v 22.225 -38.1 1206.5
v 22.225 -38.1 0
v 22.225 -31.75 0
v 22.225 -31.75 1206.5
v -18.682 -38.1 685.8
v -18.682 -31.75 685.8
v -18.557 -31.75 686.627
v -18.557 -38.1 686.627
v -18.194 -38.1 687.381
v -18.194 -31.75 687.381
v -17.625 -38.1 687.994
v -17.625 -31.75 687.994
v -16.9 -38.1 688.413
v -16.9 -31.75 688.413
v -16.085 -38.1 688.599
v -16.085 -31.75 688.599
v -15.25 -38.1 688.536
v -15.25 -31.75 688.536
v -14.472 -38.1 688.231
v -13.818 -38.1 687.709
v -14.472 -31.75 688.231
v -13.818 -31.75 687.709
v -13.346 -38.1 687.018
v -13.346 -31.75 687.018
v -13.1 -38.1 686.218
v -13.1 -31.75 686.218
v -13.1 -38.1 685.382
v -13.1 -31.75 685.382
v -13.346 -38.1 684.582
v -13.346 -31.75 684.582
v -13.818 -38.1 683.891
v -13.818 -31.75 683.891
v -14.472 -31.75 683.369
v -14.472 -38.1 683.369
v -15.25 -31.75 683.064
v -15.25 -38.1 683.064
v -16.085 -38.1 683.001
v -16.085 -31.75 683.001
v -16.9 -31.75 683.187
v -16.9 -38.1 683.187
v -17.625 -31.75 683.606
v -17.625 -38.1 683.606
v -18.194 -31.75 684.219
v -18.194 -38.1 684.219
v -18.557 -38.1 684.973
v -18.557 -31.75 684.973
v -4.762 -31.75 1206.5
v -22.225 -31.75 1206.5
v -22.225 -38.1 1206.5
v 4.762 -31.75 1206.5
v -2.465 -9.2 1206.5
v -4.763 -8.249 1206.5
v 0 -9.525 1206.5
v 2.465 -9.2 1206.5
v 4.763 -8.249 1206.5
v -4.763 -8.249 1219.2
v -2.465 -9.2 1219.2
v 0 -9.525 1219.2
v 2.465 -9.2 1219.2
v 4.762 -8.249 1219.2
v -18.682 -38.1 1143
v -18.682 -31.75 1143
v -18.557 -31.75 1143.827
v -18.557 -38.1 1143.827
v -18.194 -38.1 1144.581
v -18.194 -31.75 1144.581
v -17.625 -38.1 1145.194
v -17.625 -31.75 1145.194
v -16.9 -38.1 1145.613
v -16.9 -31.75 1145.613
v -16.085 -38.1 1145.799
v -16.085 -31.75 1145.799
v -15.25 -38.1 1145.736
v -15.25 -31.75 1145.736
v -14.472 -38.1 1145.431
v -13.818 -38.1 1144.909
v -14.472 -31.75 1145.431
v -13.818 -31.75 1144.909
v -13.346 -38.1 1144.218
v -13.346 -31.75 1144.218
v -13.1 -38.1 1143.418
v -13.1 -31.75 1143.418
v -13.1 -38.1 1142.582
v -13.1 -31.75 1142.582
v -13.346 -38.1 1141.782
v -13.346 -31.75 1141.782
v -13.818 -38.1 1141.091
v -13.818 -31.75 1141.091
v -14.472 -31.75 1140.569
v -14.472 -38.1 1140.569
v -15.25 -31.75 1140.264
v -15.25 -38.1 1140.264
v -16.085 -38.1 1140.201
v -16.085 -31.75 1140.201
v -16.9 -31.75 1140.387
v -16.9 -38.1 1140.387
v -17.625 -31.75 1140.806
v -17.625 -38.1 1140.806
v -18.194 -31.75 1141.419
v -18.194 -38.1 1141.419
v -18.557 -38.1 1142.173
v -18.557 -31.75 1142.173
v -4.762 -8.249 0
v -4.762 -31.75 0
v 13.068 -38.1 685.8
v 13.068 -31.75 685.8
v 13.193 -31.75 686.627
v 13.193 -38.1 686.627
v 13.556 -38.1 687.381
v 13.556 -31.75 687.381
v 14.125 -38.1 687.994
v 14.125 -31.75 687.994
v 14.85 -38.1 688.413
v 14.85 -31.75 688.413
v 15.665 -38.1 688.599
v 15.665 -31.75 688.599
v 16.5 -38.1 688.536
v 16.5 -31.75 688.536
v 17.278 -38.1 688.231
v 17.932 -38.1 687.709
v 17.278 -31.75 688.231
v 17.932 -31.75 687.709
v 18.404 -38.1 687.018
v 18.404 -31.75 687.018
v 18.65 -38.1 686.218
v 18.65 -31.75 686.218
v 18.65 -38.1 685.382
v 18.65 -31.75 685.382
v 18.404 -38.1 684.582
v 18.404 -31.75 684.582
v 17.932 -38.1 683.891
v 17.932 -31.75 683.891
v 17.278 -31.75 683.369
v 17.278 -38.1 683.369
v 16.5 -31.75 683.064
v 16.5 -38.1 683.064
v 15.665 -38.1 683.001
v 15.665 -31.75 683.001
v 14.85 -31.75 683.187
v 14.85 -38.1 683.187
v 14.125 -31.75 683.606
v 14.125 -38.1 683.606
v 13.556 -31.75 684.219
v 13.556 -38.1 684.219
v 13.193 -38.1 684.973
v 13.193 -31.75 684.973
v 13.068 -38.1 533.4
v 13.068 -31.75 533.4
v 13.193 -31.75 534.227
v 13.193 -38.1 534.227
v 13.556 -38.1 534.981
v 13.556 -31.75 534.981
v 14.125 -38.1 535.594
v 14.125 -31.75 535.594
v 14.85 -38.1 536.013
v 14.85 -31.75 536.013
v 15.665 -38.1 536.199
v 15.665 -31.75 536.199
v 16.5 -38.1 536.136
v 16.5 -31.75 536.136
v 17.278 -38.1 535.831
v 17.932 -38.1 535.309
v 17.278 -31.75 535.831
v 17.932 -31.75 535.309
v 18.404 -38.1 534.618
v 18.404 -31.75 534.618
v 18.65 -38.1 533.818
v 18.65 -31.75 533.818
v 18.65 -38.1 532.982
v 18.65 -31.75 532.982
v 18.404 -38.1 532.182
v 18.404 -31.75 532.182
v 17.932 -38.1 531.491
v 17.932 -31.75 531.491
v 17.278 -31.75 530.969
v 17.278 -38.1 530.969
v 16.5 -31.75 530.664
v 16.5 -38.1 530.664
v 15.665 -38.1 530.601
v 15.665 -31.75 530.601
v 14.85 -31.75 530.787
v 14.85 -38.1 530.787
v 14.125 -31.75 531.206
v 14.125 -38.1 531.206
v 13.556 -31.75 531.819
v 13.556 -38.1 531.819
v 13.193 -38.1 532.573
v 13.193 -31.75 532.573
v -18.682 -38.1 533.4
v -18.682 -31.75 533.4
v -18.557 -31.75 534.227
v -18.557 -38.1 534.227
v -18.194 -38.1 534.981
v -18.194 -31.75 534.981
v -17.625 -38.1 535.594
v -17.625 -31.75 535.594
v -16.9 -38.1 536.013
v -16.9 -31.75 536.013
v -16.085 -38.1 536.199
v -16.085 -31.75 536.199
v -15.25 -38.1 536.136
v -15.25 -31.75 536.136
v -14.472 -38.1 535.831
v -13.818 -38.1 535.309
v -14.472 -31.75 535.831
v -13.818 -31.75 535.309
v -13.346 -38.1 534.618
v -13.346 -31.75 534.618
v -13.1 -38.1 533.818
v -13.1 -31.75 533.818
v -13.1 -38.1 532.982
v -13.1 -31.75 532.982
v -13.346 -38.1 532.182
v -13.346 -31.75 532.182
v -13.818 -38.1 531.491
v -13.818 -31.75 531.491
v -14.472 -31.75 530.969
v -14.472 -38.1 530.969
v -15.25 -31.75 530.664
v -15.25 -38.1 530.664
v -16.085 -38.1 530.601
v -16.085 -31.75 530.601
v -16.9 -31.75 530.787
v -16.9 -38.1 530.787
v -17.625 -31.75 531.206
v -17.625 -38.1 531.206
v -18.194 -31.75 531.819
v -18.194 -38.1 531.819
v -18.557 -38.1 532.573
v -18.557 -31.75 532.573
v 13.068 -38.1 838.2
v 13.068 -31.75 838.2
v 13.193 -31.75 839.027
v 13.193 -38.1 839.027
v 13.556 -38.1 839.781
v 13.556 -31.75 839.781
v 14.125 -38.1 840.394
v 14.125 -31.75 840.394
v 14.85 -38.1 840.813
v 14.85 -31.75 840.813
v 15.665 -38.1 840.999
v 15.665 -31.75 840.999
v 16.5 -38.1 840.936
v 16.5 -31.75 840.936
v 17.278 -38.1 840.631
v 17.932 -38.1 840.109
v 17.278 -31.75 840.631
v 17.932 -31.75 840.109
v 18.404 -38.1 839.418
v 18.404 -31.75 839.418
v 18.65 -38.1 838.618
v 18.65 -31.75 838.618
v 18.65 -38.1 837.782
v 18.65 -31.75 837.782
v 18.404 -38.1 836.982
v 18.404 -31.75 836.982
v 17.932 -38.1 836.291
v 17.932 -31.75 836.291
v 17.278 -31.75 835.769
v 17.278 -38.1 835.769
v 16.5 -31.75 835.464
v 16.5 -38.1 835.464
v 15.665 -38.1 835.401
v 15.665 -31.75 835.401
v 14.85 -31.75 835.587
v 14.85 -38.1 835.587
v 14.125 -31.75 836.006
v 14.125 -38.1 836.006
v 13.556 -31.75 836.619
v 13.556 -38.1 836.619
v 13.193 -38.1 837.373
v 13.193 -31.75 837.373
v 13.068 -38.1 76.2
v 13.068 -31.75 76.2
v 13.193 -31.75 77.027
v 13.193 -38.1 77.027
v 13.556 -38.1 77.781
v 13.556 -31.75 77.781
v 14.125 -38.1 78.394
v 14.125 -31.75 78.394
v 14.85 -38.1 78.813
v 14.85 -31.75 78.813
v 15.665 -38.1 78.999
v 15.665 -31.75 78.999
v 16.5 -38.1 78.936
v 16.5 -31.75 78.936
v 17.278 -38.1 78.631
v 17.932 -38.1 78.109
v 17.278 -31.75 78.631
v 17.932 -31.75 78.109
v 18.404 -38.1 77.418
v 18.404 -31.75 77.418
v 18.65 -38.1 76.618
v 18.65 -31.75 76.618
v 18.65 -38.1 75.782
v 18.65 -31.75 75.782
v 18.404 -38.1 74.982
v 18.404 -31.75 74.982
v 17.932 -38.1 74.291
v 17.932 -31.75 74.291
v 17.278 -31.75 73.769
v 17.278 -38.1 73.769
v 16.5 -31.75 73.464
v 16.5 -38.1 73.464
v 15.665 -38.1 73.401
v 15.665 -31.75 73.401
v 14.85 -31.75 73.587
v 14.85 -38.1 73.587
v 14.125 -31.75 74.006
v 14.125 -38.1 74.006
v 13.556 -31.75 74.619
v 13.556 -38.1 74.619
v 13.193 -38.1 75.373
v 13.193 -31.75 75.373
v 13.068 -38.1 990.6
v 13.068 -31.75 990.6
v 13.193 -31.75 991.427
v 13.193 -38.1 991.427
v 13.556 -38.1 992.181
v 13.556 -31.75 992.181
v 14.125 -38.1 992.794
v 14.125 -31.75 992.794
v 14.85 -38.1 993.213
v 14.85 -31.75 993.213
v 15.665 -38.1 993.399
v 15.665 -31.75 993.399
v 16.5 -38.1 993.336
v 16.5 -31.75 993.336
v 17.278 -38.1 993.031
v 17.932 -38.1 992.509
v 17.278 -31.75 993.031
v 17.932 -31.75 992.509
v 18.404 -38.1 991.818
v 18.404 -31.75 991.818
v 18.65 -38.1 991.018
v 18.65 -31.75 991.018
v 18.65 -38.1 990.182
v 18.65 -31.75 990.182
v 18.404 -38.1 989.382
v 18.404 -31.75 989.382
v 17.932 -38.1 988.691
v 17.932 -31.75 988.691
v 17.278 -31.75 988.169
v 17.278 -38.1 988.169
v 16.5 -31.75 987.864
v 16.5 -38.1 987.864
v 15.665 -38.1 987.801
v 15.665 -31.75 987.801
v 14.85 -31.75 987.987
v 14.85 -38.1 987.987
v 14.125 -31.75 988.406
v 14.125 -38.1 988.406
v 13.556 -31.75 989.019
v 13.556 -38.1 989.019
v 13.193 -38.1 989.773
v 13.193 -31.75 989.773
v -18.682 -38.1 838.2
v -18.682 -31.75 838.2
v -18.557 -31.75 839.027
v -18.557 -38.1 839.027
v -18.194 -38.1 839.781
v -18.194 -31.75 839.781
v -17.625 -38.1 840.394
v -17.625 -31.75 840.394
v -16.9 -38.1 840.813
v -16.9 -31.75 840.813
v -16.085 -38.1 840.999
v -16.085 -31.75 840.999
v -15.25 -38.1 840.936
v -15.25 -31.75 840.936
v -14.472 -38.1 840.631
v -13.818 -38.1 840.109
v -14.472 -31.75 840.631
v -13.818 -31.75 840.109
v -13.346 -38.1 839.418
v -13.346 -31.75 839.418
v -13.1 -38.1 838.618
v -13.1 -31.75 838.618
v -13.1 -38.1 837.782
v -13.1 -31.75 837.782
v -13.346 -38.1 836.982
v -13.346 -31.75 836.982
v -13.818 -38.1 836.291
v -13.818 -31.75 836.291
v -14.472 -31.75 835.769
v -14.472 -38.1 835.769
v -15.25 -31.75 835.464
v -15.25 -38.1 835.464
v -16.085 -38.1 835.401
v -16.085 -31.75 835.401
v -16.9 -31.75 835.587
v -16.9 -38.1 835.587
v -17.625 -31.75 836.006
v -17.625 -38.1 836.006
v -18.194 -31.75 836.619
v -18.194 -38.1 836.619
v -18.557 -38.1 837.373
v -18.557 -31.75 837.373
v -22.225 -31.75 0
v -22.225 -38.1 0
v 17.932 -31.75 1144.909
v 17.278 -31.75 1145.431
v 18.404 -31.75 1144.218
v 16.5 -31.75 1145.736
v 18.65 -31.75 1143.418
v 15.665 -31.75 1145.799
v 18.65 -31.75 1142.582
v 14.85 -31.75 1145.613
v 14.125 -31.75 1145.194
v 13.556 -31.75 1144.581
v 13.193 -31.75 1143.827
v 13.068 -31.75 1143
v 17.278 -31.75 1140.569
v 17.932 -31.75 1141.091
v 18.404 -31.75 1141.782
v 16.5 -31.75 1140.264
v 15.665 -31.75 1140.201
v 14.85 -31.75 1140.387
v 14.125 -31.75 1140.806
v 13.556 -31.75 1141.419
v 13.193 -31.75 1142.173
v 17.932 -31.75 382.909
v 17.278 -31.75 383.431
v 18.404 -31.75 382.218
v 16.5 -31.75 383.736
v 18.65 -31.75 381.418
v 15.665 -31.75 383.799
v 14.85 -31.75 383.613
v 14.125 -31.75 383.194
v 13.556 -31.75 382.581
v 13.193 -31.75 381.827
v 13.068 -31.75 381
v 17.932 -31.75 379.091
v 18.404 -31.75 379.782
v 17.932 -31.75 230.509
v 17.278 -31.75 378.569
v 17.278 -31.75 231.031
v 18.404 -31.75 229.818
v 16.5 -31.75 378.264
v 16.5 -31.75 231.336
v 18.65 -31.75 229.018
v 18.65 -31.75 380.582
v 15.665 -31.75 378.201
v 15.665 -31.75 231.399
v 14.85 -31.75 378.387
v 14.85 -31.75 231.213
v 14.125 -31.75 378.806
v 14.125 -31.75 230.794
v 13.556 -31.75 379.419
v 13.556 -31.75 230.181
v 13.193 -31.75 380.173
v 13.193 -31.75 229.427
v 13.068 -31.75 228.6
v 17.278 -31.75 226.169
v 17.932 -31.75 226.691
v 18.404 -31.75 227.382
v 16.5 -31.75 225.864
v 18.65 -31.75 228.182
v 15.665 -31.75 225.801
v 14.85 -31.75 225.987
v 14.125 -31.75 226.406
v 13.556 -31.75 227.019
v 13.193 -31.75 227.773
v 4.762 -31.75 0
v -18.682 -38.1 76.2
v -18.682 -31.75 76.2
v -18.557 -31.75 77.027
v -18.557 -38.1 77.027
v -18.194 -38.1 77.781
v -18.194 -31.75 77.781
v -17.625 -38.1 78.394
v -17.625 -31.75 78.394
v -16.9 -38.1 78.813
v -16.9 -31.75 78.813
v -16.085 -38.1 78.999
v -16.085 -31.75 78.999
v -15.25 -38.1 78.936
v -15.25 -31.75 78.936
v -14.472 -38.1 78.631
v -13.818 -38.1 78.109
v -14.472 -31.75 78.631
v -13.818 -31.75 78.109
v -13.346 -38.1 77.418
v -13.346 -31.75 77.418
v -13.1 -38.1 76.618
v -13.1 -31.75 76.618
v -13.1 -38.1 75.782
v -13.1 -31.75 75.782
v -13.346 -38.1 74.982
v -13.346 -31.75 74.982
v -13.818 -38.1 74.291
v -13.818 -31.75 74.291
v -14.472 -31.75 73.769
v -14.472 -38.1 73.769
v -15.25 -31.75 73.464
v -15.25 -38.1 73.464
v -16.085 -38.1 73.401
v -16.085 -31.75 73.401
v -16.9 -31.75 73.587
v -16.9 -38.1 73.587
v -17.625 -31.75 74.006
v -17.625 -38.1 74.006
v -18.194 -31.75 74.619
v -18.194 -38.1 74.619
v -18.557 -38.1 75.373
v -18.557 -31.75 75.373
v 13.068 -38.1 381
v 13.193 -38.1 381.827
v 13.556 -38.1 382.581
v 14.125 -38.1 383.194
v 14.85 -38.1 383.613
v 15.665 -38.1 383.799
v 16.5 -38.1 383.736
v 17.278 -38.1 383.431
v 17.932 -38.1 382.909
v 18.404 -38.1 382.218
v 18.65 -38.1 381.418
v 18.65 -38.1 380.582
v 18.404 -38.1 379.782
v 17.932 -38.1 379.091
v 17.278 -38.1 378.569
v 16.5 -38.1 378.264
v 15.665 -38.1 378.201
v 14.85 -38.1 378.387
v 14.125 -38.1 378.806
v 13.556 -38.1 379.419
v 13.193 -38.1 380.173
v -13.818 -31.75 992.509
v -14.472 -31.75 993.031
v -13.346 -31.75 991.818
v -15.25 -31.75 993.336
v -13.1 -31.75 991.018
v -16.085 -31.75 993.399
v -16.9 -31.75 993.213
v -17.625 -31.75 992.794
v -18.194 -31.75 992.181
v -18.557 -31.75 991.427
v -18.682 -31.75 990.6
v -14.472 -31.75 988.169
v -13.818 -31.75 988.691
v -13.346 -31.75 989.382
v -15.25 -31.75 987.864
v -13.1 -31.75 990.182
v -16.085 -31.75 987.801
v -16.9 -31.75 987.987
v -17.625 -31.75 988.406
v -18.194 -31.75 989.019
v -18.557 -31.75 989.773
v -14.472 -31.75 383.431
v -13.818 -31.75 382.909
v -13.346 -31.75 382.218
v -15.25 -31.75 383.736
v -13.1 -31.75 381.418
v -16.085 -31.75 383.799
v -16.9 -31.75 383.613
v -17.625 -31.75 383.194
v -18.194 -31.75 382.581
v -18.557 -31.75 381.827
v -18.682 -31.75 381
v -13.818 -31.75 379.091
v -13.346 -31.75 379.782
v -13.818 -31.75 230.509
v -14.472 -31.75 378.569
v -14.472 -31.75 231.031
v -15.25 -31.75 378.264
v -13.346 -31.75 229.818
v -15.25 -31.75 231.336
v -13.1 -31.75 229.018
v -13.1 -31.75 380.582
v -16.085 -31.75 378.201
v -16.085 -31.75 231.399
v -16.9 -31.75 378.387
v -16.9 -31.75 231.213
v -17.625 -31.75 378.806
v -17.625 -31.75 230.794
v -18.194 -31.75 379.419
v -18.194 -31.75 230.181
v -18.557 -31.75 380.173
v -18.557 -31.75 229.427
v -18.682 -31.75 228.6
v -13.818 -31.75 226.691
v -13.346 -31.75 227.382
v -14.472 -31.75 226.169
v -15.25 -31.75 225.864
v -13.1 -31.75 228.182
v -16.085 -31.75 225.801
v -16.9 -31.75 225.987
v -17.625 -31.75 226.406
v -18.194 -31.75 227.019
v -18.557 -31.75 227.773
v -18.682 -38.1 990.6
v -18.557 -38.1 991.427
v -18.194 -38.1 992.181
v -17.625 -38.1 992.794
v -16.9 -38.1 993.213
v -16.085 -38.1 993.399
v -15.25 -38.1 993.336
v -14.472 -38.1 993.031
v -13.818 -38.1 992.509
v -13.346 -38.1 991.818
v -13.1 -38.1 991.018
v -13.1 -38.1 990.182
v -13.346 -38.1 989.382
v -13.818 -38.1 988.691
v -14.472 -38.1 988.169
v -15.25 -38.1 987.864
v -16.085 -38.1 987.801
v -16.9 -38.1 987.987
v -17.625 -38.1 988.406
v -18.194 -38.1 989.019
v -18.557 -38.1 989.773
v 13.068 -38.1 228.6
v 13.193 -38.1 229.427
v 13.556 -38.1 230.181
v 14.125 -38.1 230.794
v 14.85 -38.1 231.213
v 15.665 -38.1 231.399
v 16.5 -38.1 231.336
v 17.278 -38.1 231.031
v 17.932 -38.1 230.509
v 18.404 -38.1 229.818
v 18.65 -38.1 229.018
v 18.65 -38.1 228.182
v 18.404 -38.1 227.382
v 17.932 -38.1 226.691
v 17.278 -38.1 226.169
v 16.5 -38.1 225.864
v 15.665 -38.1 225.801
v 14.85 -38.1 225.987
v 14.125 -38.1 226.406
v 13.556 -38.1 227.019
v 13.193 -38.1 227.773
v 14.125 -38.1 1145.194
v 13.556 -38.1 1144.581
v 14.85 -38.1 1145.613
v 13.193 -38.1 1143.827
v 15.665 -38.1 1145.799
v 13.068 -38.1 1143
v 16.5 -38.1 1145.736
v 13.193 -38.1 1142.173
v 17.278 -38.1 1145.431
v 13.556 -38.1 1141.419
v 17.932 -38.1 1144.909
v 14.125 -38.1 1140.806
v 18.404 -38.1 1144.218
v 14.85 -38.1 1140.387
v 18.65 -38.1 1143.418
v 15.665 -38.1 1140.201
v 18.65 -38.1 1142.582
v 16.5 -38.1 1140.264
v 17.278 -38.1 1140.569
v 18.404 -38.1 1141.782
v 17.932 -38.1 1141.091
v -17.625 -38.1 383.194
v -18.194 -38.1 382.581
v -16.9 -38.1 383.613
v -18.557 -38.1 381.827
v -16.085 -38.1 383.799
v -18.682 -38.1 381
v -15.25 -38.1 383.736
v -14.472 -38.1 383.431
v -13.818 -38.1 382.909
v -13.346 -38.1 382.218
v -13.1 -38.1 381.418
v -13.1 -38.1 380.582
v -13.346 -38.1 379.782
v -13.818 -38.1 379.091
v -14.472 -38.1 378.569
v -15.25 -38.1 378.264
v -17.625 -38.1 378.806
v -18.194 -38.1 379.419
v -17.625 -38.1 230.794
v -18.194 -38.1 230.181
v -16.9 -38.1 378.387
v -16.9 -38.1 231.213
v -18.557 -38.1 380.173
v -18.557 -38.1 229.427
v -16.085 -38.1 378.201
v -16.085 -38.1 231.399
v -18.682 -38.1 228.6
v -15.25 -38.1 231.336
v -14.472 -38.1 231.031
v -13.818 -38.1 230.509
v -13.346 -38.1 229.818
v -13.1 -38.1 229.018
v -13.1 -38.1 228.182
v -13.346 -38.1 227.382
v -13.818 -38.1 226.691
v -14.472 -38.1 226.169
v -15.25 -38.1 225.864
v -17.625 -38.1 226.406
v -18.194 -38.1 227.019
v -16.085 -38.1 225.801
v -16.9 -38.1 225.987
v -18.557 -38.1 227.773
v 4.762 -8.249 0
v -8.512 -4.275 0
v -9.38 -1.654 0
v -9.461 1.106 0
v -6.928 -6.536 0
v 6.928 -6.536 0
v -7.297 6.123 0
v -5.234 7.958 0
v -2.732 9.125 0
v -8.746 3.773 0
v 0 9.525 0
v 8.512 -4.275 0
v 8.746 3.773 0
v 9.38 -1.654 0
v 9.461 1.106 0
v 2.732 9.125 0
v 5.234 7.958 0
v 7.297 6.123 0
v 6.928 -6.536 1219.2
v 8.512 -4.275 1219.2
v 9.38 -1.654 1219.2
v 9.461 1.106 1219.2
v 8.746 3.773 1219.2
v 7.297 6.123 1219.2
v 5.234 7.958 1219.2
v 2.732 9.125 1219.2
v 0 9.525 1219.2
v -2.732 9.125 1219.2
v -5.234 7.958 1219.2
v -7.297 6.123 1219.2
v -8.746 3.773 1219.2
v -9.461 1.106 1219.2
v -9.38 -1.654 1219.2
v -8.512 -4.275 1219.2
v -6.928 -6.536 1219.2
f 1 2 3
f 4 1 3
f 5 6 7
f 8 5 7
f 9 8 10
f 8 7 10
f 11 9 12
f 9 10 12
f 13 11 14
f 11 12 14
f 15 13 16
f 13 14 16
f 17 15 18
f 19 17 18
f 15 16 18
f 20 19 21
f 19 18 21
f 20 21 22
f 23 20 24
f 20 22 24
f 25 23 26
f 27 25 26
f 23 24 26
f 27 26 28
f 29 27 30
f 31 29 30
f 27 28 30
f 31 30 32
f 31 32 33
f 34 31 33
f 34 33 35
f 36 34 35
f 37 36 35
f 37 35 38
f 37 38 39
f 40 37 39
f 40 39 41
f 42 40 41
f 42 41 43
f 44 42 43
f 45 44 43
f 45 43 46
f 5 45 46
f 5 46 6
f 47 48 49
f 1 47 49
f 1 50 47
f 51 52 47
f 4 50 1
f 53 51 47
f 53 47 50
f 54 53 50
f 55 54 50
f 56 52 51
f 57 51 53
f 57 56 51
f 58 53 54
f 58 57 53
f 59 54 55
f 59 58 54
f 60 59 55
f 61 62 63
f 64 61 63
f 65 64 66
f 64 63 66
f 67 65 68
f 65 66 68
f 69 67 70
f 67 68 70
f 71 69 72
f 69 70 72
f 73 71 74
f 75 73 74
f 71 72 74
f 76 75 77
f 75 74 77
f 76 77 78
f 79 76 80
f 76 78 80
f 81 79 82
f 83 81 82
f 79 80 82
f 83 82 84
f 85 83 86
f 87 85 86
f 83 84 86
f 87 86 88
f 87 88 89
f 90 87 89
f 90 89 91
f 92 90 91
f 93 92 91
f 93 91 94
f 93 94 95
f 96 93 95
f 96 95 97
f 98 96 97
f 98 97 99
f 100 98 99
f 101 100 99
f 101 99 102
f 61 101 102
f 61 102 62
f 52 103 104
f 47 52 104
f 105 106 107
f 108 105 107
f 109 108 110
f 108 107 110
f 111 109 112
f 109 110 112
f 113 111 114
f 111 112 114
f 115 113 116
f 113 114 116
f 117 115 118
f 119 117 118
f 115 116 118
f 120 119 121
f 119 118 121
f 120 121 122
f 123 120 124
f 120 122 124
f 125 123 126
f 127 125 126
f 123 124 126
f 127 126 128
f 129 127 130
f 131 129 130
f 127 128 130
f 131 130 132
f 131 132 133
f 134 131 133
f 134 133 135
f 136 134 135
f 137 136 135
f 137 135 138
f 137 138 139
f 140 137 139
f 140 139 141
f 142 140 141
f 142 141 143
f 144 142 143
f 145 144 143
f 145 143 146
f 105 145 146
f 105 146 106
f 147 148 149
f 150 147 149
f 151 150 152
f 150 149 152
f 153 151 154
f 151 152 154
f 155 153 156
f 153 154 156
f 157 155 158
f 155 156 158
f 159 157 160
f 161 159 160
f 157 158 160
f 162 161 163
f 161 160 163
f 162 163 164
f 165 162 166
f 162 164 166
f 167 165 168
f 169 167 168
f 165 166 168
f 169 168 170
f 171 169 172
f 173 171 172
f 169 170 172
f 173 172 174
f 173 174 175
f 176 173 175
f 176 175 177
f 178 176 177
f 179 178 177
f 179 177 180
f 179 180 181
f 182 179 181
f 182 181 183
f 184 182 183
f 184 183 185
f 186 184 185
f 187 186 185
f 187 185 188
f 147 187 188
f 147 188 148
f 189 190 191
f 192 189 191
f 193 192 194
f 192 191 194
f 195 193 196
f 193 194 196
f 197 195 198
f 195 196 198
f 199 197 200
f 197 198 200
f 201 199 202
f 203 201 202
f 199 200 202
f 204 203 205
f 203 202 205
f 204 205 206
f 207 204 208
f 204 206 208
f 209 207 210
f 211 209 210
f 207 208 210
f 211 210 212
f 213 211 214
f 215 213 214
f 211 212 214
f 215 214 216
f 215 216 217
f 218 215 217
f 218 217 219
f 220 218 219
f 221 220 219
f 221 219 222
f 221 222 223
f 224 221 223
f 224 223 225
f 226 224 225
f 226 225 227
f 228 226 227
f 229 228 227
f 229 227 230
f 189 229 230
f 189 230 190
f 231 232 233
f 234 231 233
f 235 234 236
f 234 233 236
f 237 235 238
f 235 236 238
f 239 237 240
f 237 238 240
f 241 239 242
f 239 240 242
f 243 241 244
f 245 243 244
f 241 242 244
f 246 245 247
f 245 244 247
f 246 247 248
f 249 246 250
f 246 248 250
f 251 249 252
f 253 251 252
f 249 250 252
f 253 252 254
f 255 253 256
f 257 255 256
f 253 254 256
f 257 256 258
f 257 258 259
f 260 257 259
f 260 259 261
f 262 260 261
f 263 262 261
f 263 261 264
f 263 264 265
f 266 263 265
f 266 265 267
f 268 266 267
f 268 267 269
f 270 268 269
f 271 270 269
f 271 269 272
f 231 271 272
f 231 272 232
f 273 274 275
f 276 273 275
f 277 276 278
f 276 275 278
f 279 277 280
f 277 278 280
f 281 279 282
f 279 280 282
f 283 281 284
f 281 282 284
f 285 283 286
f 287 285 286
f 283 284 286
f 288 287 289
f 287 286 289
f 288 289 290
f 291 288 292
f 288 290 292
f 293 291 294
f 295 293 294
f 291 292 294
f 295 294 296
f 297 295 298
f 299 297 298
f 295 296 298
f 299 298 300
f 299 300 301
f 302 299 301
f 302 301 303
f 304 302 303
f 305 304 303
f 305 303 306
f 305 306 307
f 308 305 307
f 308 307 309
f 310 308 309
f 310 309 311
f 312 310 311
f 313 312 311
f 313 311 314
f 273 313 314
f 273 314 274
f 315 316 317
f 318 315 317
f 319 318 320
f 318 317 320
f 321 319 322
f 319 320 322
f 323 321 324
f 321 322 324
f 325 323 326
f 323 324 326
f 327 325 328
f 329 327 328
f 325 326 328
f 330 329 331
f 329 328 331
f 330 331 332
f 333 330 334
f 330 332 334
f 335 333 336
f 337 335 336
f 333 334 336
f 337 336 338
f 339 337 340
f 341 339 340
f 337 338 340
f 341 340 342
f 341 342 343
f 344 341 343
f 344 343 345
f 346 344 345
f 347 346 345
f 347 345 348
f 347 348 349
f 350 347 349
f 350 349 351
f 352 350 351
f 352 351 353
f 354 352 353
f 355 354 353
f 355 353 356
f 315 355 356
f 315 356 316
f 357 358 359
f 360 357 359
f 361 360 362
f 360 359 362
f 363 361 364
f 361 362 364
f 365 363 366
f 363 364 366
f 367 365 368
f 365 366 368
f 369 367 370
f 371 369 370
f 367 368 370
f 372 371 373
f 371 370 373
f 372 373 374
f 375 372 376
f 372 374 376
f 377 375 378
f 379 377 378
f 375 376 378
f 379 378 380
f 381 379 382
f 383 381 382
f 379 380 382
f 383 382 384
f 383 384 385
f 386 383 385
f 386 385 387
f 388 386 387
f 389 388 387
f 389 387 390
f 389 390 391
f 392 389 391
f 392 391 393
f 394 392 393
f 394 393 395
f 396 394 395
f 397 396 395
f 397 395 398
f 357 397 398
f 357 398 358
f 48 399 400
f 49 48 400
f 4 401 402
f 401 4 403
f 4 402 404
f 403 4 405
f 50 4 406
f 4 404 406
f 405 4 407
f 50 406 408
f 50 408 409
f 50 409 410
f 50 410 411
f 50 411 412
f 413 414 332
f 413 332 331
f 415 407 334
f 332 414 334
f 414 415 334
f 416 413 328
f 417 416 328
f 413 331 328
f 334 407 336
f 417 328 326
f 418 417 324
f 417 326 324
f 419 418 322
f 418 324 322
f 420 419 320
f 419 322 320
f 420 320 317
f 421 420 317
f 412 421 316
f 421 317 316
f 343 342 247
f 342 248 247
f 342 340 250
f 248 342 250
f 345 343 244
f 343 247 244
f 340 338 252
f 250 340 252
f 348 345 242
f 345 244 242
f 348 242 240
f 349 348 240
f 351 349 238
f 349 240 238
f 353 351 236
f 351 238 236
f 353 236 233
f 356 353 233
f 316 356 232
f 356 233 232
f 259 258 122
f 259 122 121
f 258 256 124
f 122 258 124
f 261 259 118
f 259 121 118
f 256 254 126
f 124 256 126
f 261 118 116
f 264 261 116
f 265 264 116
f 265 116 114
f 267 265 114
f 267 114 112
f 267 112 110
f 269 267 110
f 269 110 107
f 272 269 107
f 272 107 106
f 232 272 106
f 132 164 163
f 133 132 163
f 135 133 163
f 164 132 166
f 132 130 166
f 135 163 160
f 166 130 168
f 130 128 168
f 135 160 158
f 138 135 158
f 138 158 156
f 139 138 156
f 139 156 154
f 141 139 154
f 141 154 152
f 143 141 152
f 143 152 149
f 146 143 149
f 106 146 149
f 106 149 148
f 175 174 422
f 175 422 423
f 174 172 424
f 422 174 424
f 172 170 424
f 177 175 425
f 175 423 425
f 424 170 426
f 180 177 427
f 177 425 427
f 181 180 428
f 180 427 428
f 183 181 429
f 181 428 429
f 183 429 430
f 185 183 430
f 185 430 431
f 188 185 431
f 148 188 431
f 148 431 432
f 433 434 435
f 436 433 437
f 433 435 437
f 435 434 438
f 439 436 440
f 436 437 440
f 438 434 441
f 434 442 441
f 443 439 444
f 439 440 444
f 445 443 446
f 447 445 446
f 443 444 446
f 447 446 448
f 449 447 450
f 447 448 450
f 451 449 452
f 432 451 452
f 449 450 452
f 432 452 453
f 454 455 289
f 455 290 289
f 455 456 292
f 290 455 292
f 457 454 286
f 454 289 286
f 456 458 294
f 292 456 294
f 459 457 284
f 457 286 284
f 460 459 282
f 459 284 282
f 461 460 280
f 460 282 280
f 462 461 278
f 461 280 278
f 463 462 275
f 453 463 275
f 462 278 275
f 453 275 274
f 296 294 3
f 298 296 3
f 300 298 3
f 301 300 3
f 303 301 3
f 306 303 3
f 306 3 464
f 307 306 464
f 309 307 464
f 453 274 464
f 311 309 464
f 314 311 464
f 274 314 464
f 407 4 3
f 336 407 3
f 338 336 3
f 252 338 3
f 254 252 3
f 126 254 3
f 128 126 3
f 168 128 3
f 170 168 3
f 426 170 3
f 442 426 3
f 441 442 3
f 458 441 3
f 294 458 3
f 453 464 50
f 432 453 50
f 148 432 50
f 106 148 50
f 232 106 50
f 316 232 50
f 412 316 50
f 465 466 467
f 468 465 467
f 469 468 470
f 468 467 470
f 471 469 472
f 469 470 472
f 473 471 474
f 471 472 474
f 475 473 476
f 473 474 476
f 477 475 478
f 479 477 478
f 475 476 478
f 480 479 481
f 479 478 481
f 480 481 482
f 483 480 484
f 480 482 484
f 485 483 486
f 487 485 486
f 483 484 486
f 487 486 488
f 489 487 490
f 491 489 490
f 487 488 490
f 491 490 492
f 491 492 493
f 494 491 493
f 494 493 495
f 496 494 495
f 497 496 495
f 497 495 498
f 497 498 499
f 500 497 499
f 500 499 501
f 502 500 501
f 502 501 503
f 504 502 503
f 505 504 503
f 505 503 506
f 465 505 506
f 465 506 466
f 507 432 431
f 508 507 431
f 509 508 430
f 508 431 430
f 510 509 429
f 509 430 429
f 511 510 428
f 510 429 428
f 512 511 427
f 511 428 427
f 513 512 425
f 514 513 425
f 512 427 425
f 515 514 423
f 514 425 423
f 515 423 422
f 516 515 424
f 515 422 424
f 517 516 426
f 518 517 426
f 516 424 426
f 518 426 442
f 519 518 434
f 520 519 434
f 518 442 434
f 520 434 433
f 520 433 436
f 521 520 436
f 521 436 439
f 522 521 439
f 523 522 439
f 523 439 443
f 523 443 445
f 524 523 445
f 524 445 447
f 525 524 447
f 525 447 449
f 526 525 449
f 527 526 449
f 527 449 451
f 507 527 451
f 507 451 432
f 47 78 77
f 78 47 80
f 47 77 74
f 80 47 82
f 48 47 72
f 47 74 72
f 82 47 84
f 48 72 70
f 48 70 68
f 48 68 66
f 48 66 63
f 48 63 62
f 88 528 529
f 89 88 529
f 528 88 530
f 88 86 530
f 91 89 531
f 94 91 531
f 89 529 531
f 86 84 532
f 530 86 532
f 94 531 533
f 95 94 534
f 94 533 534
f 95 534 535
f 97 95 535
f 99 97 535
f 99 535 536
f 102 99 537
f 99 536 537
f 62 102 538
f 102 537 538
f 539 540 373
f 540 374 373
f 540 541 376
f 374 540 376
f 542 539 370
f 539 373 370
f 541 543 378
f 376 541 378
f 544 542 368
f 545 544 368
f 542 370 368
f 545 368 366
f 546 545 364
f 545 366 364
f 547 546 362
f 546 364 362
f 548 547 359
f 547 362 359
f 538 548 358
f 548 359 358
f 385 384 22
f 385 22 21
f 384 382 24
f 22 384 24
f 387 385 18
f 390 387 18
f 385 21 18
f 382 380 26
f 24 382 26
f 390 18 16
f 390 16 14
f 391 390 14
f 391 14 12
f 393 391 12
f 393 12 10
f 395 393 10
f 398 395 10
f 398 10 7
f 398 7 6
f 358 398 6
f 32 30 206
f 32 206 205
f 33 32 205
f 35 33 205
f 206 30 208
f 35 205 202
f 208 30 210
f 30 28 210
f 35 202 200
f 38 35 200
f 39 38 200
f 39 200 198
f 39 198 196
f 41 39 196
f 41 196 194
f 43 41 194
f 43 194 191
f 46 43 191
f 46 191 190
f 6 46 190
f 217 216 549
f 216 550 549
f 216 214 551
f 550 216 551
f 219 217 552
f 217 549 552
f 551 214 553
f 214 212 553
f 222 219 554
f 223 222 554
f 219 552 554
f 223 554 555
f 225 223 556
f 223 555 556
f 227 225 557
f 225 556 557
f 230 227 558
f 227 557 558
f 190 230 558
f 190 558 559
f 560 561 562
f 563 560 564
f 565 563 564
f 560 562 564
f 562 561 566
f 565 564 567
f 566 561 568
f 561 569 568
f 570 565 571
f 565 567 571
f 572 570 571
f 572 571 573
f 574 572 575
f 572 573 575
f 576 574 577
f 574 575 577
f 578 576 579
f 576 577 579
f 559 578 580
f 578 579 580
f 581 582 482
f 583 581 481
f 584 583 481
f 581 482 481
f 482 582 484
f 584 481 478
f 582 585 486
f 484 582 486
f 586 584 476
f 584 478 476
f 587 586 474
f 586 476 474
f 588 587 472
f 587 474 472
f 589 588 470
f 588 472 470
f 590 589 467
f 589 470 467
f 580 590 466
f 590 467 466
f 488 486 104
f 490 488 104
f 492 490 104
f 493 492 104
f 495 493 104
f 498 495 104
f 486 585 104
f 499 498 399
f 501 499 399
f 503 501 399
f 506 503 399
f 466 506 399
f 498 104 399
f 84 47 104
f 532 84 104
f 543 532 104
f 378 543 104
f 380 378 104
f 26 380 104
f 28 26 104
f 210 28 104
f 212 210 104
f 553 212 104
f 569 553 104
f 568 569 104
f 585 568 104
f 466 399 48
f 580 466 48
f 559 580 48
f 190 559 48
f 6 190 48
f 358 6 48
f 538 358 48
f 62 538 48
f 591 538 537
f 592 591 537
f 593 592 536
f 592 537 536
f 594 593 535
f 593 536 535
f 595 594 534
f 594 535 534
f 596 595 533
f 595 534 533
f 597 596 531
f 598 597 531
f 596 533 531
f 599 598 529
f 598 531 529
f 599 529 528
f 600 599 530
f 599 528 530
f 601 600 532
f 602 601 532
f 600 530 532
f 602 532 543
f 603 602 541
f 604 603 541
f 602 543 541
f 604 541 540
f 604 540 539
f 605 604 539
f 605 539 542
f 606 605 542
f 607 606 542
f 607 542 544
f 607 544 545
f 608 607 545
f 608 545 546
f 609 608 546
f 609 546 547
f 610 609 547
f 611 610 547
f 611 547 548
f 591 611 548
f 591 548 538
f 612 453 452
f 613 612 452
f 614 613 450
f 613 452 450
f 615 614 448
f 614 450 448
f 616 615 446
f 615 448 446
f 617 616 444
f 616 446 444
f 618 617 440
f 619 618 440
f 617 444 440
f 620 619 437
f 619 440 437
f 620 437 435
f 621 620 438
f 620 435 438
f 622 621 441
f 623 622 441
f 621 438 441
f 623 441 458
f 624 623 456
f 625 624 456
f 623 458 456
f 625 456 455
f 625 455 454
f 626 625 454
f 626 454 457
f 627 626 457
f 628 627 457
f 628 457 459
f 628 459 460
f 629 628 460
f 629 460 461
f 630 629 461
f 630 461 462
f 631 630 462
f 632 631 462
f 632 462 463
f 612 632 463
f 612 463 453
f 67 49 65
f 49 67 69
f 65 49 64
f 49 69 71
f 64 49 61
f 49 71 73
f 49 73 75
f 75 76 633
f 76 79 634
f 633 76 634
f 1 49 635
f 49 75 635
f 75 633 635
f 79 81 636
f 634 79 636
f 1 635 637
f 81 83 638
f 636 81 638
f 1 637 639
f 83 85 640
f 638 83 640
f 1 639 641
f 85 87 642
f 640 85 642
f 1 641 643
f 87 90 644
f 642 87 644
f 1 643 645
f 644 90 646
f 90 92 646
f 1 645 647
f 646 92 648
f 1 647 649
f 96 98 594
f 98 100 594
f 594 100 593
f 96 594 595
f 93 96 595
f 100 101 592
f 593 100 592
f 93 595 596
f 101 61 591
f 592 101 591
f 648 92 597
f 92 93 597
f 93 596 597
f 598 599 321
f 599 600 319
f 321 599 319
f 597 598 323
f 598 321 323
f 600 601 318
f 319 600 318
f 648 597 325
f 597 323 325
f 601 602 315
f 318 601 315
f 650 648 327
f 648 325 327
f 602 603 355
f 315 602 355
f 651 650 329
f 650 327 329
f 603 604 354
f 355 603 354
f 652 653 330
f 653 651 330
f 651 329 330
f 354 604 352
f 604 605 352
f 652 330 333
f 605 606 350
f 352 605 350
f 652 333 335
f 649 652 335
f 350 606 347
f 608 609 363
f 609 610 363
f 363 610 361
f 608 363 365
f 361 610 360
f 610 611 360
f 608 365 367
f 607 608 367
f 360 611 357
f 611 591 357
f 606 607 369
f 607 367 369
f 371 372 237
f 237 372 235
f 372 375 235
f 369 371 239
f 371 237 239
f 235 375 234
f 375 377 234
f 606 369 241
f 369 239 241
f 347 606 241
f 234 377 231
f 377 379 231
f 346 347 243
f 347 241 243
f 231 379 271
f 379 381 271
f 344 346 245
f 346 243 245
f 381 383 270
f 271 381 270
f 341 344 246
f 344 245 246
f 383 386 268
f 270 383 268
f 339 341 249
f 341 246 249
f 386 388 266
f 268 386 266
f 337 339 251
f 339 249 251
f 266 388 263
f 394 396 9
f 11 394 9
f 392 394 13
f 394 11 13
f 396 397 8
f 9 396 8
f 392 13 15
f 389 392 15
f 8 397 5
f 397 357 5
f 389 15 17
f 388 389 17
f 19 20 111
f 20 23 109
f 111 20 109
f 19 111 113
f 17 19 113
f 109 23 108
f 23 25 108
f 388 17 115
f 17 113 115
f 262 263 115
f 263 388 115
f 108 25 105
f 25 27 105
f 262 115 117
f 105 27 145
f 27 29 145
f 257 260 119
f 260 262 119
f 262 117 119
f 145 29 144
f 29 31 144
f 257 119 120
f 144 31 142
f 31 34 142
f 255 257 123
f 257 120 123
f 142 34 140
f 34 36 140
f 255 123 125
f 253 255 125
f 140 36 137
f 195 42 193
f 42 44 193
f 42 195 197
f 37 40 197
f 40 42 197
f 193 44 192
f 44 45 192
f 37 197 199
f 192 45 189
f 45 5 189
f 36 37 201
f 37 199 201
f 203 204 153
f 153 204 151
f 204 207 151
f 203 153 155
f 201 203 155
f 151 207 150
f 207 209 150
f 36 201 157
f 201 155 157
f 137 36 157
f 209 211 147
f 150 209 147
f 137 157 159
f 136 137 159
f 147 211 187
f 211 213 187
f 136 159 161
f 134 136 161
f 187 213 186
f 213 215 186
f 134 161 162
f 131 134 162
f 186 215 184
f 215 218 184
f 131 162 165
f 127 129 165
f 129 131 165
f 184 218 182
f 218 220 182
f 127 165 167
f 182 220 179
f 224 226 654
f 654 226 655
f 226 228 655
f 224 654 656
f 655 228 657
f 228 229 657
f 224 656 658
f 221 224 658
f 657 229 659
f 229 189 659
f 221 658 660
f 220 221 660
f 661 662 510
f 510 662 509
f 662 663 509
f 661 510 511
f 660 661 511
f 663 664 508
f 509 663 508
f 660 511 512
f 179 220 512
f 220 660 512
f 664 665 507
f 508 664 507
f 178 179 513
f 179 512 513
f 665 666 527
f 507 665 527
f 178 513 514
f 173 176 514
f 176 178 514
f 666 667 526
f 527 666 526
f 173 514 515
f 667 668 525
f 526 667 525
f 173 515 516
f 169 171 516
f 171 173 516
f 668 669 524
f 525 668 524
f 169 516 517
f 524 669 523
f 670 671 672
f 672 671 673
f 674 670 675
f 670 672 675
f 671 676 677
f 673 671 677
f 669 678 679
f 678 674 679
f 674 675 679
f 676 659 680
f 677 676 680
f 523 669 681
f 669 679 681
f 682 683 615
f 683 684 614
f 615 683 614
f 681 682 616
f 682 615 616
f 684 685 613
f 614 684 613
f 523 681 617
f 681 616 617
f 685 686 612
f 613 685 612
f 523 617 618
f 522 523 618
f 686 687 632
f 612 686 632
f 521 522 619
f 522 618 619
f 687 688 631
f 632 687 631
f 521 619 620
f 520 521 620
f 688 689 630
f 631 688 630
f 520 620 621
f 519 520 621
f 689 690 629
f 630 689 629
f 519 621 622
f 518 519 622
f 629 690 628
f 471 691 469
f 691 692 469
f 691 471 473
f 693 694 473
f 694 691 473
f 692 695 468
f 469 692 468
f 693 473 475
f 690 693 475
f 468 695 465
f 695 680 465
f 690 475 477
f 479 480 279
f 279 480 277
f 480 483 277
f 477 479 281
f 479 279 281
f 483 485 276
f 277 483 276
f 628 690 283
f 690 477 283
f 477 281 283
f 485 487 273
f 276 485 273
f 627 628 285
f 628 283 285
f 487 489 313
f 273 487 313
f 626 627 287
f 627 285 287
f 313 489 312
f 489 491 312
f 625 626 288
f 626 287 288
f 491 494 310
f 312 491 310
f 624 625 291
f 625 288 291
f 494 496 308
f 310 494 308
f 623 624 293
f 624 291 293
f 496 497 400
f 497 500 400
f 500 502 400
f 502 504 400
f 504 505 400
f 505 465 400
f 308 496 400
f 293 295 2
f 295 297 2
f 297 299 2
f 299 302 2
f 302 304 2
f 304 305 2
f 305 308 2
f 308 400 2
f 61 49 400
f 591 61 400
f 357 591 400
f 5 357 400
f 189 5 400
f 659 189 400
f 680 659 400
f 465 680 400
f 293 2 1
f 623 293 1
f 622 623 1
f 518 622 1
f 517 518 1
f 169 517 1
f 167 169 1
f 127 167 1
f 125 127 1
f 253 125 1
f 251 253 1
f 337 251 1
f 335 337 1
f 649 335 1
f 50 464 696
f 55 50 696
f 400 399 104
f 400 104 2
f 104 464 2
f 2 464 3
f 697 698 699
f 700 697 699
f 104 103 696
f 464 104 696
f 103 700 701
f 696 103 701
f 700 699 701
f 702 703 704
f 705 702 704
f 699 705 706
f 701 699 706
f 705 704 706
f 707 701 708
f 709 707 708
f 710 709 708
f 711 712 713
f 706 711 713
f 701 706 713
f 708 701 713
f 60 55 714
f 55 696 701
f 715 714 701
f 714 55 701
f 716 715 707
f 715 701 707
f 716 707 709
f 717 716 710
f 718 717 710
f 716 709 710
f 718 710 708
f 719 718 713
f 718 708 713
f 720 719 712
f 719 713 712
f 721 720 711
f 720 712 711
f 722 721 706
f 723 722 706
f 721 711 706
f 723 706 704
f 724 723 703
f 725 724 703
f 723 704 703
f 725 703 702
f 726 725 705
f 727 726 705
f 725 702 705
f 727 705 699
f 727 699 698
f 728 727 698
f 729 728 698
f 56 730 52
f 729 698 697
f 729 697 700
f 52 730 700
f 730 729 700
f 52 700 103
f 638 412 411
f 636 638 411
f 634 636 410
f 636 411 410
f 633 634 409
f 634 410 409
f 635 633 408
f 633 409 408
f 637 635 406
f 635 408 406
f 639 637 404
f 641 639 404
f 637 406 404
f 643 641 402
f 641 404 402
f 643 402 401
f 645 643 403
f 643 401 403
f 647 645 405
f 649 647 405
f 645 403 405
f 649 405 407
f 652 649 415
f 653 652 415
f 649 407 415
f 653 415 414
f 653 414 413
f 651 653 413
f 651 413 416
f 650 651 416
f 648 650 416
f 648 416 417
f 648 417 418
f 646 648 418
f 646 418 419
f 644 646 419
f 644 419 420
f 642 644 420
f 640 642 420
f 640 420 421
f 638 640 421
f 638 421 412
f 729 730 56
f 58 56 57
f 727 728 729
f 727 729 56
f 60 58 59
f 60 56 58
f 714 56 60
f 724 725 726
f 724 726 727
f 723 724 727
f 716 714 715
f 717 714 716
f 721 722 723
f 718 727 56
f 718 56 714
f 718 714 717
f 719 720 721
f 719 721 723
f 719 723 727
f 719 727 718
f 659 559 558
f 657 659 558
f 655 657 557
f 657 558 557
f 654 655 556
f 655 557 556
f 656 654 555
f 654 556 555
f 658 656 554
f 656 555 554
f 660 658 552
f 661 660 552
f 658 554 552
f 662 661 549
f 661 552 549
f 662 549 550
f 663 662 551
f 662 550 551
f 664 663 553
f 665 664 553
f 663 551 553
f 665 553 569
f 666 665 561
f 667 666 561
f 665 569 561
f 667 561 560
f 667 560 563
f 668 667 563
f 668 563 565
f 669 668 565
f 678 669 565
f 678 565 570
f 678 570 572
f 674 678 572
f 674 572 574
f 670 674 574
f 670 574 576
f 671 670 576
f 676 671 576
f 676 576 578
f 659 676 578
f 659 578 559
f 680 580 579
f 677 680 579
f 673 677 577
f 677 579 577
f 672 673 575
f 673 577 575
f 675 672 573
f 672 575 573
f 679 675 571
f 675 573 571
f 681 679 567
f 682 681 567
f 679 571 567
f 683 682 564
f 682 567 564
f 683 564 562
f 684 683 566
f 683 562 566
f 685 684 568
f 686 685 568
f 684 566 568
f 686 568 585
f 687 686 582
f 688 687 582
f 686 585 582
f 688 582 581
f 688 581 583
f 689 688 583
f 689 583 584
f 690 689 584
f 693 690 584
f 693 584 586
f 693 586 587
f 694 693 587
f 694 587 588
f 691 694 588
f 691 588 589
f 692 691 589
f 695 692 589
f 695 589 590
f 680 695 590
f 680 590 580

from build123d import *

# Parameters (mm, degrees)
EXTRUDE1_DEPTH         = 1219.2
F_10_CLEARANCE_HOLE1_D = 5.6134
LPATTERN3_COUNT        = 8
LPATTERN3_PITCH        = 152.4
SKETCH4_OUTSIDE_W      = 290.638
SKETCH4_OUTSIDE_H      = 293.813
SKETCH4_OUTSIDE_R      = 9.525
CUT_EXTRUDE1_DEPTH     = 12.7


with BuildPart() as part:
    # Sketch1 → Extrude1 (new body)
    with BuildSketch(Plane.XY):
        with BuildLine():
            Line((-22.225, -38.1), (22.225, -38.1))
            Line((22.225, -38.1), (22.225, -31.75))
            Line((22.225, -31.75), (4.7625, -31.75))
            Line((4.7625, -31.75), (4.7625, -8.248891971))
            ThreePointArc((4.7625, -8.248891971), (0, 9.525), (-4.7625, -8.248891971))
            Line((-4.7625, -8.248891971), (-4.7625, -31.75))
            Line((-4.7625, -31.75), (-22.225, -31.75))
            Line((-22.225, -31.75), (-22.225, -38.1))
        make_face()
    extrude(amount=EXTRUDE1_DEPTH)

    # #10 Clearance Hole1 (through all)
    with Locations(Plane.XZ.offset(38.1)):
        with Locations((-15.875, 76.2), (15.875, 76.2)):
            f_10_clearance_hole1 = Hole(F_10_CLEARANCE_HOLE1_D / 2)

    # LPattern3: #10 Clearance Hole1 ×8
    with Locations(*[(0, 0, i * LPATTERN3_PITCH) for i in range(1, LPATTERN3_COUNT)]):
        add(f_10_clearance_hole1, mode=Mode.SUBTRACT)

    # Sketch4 outside → Cut-Extrude1 (cut)
    with BuildSketch(Plane.XY.offset(1219.2)):
        with Locations((0, -14.2875)):
            Rectangle(SKETCH4_OUTSIDE_W, SKETCH4_OUTSIDE_H)
        with Locations(Location((0, 0, 0), (0, 0, 240))):
            Circle(SKETCH4_OUTSIDE_R, mode=Mode.SUBTRACT)
    extrude(amount=-CUT_EXTRUDE1_DEPTH, mode=Mode.SUBTRACT)


solid = part.part
